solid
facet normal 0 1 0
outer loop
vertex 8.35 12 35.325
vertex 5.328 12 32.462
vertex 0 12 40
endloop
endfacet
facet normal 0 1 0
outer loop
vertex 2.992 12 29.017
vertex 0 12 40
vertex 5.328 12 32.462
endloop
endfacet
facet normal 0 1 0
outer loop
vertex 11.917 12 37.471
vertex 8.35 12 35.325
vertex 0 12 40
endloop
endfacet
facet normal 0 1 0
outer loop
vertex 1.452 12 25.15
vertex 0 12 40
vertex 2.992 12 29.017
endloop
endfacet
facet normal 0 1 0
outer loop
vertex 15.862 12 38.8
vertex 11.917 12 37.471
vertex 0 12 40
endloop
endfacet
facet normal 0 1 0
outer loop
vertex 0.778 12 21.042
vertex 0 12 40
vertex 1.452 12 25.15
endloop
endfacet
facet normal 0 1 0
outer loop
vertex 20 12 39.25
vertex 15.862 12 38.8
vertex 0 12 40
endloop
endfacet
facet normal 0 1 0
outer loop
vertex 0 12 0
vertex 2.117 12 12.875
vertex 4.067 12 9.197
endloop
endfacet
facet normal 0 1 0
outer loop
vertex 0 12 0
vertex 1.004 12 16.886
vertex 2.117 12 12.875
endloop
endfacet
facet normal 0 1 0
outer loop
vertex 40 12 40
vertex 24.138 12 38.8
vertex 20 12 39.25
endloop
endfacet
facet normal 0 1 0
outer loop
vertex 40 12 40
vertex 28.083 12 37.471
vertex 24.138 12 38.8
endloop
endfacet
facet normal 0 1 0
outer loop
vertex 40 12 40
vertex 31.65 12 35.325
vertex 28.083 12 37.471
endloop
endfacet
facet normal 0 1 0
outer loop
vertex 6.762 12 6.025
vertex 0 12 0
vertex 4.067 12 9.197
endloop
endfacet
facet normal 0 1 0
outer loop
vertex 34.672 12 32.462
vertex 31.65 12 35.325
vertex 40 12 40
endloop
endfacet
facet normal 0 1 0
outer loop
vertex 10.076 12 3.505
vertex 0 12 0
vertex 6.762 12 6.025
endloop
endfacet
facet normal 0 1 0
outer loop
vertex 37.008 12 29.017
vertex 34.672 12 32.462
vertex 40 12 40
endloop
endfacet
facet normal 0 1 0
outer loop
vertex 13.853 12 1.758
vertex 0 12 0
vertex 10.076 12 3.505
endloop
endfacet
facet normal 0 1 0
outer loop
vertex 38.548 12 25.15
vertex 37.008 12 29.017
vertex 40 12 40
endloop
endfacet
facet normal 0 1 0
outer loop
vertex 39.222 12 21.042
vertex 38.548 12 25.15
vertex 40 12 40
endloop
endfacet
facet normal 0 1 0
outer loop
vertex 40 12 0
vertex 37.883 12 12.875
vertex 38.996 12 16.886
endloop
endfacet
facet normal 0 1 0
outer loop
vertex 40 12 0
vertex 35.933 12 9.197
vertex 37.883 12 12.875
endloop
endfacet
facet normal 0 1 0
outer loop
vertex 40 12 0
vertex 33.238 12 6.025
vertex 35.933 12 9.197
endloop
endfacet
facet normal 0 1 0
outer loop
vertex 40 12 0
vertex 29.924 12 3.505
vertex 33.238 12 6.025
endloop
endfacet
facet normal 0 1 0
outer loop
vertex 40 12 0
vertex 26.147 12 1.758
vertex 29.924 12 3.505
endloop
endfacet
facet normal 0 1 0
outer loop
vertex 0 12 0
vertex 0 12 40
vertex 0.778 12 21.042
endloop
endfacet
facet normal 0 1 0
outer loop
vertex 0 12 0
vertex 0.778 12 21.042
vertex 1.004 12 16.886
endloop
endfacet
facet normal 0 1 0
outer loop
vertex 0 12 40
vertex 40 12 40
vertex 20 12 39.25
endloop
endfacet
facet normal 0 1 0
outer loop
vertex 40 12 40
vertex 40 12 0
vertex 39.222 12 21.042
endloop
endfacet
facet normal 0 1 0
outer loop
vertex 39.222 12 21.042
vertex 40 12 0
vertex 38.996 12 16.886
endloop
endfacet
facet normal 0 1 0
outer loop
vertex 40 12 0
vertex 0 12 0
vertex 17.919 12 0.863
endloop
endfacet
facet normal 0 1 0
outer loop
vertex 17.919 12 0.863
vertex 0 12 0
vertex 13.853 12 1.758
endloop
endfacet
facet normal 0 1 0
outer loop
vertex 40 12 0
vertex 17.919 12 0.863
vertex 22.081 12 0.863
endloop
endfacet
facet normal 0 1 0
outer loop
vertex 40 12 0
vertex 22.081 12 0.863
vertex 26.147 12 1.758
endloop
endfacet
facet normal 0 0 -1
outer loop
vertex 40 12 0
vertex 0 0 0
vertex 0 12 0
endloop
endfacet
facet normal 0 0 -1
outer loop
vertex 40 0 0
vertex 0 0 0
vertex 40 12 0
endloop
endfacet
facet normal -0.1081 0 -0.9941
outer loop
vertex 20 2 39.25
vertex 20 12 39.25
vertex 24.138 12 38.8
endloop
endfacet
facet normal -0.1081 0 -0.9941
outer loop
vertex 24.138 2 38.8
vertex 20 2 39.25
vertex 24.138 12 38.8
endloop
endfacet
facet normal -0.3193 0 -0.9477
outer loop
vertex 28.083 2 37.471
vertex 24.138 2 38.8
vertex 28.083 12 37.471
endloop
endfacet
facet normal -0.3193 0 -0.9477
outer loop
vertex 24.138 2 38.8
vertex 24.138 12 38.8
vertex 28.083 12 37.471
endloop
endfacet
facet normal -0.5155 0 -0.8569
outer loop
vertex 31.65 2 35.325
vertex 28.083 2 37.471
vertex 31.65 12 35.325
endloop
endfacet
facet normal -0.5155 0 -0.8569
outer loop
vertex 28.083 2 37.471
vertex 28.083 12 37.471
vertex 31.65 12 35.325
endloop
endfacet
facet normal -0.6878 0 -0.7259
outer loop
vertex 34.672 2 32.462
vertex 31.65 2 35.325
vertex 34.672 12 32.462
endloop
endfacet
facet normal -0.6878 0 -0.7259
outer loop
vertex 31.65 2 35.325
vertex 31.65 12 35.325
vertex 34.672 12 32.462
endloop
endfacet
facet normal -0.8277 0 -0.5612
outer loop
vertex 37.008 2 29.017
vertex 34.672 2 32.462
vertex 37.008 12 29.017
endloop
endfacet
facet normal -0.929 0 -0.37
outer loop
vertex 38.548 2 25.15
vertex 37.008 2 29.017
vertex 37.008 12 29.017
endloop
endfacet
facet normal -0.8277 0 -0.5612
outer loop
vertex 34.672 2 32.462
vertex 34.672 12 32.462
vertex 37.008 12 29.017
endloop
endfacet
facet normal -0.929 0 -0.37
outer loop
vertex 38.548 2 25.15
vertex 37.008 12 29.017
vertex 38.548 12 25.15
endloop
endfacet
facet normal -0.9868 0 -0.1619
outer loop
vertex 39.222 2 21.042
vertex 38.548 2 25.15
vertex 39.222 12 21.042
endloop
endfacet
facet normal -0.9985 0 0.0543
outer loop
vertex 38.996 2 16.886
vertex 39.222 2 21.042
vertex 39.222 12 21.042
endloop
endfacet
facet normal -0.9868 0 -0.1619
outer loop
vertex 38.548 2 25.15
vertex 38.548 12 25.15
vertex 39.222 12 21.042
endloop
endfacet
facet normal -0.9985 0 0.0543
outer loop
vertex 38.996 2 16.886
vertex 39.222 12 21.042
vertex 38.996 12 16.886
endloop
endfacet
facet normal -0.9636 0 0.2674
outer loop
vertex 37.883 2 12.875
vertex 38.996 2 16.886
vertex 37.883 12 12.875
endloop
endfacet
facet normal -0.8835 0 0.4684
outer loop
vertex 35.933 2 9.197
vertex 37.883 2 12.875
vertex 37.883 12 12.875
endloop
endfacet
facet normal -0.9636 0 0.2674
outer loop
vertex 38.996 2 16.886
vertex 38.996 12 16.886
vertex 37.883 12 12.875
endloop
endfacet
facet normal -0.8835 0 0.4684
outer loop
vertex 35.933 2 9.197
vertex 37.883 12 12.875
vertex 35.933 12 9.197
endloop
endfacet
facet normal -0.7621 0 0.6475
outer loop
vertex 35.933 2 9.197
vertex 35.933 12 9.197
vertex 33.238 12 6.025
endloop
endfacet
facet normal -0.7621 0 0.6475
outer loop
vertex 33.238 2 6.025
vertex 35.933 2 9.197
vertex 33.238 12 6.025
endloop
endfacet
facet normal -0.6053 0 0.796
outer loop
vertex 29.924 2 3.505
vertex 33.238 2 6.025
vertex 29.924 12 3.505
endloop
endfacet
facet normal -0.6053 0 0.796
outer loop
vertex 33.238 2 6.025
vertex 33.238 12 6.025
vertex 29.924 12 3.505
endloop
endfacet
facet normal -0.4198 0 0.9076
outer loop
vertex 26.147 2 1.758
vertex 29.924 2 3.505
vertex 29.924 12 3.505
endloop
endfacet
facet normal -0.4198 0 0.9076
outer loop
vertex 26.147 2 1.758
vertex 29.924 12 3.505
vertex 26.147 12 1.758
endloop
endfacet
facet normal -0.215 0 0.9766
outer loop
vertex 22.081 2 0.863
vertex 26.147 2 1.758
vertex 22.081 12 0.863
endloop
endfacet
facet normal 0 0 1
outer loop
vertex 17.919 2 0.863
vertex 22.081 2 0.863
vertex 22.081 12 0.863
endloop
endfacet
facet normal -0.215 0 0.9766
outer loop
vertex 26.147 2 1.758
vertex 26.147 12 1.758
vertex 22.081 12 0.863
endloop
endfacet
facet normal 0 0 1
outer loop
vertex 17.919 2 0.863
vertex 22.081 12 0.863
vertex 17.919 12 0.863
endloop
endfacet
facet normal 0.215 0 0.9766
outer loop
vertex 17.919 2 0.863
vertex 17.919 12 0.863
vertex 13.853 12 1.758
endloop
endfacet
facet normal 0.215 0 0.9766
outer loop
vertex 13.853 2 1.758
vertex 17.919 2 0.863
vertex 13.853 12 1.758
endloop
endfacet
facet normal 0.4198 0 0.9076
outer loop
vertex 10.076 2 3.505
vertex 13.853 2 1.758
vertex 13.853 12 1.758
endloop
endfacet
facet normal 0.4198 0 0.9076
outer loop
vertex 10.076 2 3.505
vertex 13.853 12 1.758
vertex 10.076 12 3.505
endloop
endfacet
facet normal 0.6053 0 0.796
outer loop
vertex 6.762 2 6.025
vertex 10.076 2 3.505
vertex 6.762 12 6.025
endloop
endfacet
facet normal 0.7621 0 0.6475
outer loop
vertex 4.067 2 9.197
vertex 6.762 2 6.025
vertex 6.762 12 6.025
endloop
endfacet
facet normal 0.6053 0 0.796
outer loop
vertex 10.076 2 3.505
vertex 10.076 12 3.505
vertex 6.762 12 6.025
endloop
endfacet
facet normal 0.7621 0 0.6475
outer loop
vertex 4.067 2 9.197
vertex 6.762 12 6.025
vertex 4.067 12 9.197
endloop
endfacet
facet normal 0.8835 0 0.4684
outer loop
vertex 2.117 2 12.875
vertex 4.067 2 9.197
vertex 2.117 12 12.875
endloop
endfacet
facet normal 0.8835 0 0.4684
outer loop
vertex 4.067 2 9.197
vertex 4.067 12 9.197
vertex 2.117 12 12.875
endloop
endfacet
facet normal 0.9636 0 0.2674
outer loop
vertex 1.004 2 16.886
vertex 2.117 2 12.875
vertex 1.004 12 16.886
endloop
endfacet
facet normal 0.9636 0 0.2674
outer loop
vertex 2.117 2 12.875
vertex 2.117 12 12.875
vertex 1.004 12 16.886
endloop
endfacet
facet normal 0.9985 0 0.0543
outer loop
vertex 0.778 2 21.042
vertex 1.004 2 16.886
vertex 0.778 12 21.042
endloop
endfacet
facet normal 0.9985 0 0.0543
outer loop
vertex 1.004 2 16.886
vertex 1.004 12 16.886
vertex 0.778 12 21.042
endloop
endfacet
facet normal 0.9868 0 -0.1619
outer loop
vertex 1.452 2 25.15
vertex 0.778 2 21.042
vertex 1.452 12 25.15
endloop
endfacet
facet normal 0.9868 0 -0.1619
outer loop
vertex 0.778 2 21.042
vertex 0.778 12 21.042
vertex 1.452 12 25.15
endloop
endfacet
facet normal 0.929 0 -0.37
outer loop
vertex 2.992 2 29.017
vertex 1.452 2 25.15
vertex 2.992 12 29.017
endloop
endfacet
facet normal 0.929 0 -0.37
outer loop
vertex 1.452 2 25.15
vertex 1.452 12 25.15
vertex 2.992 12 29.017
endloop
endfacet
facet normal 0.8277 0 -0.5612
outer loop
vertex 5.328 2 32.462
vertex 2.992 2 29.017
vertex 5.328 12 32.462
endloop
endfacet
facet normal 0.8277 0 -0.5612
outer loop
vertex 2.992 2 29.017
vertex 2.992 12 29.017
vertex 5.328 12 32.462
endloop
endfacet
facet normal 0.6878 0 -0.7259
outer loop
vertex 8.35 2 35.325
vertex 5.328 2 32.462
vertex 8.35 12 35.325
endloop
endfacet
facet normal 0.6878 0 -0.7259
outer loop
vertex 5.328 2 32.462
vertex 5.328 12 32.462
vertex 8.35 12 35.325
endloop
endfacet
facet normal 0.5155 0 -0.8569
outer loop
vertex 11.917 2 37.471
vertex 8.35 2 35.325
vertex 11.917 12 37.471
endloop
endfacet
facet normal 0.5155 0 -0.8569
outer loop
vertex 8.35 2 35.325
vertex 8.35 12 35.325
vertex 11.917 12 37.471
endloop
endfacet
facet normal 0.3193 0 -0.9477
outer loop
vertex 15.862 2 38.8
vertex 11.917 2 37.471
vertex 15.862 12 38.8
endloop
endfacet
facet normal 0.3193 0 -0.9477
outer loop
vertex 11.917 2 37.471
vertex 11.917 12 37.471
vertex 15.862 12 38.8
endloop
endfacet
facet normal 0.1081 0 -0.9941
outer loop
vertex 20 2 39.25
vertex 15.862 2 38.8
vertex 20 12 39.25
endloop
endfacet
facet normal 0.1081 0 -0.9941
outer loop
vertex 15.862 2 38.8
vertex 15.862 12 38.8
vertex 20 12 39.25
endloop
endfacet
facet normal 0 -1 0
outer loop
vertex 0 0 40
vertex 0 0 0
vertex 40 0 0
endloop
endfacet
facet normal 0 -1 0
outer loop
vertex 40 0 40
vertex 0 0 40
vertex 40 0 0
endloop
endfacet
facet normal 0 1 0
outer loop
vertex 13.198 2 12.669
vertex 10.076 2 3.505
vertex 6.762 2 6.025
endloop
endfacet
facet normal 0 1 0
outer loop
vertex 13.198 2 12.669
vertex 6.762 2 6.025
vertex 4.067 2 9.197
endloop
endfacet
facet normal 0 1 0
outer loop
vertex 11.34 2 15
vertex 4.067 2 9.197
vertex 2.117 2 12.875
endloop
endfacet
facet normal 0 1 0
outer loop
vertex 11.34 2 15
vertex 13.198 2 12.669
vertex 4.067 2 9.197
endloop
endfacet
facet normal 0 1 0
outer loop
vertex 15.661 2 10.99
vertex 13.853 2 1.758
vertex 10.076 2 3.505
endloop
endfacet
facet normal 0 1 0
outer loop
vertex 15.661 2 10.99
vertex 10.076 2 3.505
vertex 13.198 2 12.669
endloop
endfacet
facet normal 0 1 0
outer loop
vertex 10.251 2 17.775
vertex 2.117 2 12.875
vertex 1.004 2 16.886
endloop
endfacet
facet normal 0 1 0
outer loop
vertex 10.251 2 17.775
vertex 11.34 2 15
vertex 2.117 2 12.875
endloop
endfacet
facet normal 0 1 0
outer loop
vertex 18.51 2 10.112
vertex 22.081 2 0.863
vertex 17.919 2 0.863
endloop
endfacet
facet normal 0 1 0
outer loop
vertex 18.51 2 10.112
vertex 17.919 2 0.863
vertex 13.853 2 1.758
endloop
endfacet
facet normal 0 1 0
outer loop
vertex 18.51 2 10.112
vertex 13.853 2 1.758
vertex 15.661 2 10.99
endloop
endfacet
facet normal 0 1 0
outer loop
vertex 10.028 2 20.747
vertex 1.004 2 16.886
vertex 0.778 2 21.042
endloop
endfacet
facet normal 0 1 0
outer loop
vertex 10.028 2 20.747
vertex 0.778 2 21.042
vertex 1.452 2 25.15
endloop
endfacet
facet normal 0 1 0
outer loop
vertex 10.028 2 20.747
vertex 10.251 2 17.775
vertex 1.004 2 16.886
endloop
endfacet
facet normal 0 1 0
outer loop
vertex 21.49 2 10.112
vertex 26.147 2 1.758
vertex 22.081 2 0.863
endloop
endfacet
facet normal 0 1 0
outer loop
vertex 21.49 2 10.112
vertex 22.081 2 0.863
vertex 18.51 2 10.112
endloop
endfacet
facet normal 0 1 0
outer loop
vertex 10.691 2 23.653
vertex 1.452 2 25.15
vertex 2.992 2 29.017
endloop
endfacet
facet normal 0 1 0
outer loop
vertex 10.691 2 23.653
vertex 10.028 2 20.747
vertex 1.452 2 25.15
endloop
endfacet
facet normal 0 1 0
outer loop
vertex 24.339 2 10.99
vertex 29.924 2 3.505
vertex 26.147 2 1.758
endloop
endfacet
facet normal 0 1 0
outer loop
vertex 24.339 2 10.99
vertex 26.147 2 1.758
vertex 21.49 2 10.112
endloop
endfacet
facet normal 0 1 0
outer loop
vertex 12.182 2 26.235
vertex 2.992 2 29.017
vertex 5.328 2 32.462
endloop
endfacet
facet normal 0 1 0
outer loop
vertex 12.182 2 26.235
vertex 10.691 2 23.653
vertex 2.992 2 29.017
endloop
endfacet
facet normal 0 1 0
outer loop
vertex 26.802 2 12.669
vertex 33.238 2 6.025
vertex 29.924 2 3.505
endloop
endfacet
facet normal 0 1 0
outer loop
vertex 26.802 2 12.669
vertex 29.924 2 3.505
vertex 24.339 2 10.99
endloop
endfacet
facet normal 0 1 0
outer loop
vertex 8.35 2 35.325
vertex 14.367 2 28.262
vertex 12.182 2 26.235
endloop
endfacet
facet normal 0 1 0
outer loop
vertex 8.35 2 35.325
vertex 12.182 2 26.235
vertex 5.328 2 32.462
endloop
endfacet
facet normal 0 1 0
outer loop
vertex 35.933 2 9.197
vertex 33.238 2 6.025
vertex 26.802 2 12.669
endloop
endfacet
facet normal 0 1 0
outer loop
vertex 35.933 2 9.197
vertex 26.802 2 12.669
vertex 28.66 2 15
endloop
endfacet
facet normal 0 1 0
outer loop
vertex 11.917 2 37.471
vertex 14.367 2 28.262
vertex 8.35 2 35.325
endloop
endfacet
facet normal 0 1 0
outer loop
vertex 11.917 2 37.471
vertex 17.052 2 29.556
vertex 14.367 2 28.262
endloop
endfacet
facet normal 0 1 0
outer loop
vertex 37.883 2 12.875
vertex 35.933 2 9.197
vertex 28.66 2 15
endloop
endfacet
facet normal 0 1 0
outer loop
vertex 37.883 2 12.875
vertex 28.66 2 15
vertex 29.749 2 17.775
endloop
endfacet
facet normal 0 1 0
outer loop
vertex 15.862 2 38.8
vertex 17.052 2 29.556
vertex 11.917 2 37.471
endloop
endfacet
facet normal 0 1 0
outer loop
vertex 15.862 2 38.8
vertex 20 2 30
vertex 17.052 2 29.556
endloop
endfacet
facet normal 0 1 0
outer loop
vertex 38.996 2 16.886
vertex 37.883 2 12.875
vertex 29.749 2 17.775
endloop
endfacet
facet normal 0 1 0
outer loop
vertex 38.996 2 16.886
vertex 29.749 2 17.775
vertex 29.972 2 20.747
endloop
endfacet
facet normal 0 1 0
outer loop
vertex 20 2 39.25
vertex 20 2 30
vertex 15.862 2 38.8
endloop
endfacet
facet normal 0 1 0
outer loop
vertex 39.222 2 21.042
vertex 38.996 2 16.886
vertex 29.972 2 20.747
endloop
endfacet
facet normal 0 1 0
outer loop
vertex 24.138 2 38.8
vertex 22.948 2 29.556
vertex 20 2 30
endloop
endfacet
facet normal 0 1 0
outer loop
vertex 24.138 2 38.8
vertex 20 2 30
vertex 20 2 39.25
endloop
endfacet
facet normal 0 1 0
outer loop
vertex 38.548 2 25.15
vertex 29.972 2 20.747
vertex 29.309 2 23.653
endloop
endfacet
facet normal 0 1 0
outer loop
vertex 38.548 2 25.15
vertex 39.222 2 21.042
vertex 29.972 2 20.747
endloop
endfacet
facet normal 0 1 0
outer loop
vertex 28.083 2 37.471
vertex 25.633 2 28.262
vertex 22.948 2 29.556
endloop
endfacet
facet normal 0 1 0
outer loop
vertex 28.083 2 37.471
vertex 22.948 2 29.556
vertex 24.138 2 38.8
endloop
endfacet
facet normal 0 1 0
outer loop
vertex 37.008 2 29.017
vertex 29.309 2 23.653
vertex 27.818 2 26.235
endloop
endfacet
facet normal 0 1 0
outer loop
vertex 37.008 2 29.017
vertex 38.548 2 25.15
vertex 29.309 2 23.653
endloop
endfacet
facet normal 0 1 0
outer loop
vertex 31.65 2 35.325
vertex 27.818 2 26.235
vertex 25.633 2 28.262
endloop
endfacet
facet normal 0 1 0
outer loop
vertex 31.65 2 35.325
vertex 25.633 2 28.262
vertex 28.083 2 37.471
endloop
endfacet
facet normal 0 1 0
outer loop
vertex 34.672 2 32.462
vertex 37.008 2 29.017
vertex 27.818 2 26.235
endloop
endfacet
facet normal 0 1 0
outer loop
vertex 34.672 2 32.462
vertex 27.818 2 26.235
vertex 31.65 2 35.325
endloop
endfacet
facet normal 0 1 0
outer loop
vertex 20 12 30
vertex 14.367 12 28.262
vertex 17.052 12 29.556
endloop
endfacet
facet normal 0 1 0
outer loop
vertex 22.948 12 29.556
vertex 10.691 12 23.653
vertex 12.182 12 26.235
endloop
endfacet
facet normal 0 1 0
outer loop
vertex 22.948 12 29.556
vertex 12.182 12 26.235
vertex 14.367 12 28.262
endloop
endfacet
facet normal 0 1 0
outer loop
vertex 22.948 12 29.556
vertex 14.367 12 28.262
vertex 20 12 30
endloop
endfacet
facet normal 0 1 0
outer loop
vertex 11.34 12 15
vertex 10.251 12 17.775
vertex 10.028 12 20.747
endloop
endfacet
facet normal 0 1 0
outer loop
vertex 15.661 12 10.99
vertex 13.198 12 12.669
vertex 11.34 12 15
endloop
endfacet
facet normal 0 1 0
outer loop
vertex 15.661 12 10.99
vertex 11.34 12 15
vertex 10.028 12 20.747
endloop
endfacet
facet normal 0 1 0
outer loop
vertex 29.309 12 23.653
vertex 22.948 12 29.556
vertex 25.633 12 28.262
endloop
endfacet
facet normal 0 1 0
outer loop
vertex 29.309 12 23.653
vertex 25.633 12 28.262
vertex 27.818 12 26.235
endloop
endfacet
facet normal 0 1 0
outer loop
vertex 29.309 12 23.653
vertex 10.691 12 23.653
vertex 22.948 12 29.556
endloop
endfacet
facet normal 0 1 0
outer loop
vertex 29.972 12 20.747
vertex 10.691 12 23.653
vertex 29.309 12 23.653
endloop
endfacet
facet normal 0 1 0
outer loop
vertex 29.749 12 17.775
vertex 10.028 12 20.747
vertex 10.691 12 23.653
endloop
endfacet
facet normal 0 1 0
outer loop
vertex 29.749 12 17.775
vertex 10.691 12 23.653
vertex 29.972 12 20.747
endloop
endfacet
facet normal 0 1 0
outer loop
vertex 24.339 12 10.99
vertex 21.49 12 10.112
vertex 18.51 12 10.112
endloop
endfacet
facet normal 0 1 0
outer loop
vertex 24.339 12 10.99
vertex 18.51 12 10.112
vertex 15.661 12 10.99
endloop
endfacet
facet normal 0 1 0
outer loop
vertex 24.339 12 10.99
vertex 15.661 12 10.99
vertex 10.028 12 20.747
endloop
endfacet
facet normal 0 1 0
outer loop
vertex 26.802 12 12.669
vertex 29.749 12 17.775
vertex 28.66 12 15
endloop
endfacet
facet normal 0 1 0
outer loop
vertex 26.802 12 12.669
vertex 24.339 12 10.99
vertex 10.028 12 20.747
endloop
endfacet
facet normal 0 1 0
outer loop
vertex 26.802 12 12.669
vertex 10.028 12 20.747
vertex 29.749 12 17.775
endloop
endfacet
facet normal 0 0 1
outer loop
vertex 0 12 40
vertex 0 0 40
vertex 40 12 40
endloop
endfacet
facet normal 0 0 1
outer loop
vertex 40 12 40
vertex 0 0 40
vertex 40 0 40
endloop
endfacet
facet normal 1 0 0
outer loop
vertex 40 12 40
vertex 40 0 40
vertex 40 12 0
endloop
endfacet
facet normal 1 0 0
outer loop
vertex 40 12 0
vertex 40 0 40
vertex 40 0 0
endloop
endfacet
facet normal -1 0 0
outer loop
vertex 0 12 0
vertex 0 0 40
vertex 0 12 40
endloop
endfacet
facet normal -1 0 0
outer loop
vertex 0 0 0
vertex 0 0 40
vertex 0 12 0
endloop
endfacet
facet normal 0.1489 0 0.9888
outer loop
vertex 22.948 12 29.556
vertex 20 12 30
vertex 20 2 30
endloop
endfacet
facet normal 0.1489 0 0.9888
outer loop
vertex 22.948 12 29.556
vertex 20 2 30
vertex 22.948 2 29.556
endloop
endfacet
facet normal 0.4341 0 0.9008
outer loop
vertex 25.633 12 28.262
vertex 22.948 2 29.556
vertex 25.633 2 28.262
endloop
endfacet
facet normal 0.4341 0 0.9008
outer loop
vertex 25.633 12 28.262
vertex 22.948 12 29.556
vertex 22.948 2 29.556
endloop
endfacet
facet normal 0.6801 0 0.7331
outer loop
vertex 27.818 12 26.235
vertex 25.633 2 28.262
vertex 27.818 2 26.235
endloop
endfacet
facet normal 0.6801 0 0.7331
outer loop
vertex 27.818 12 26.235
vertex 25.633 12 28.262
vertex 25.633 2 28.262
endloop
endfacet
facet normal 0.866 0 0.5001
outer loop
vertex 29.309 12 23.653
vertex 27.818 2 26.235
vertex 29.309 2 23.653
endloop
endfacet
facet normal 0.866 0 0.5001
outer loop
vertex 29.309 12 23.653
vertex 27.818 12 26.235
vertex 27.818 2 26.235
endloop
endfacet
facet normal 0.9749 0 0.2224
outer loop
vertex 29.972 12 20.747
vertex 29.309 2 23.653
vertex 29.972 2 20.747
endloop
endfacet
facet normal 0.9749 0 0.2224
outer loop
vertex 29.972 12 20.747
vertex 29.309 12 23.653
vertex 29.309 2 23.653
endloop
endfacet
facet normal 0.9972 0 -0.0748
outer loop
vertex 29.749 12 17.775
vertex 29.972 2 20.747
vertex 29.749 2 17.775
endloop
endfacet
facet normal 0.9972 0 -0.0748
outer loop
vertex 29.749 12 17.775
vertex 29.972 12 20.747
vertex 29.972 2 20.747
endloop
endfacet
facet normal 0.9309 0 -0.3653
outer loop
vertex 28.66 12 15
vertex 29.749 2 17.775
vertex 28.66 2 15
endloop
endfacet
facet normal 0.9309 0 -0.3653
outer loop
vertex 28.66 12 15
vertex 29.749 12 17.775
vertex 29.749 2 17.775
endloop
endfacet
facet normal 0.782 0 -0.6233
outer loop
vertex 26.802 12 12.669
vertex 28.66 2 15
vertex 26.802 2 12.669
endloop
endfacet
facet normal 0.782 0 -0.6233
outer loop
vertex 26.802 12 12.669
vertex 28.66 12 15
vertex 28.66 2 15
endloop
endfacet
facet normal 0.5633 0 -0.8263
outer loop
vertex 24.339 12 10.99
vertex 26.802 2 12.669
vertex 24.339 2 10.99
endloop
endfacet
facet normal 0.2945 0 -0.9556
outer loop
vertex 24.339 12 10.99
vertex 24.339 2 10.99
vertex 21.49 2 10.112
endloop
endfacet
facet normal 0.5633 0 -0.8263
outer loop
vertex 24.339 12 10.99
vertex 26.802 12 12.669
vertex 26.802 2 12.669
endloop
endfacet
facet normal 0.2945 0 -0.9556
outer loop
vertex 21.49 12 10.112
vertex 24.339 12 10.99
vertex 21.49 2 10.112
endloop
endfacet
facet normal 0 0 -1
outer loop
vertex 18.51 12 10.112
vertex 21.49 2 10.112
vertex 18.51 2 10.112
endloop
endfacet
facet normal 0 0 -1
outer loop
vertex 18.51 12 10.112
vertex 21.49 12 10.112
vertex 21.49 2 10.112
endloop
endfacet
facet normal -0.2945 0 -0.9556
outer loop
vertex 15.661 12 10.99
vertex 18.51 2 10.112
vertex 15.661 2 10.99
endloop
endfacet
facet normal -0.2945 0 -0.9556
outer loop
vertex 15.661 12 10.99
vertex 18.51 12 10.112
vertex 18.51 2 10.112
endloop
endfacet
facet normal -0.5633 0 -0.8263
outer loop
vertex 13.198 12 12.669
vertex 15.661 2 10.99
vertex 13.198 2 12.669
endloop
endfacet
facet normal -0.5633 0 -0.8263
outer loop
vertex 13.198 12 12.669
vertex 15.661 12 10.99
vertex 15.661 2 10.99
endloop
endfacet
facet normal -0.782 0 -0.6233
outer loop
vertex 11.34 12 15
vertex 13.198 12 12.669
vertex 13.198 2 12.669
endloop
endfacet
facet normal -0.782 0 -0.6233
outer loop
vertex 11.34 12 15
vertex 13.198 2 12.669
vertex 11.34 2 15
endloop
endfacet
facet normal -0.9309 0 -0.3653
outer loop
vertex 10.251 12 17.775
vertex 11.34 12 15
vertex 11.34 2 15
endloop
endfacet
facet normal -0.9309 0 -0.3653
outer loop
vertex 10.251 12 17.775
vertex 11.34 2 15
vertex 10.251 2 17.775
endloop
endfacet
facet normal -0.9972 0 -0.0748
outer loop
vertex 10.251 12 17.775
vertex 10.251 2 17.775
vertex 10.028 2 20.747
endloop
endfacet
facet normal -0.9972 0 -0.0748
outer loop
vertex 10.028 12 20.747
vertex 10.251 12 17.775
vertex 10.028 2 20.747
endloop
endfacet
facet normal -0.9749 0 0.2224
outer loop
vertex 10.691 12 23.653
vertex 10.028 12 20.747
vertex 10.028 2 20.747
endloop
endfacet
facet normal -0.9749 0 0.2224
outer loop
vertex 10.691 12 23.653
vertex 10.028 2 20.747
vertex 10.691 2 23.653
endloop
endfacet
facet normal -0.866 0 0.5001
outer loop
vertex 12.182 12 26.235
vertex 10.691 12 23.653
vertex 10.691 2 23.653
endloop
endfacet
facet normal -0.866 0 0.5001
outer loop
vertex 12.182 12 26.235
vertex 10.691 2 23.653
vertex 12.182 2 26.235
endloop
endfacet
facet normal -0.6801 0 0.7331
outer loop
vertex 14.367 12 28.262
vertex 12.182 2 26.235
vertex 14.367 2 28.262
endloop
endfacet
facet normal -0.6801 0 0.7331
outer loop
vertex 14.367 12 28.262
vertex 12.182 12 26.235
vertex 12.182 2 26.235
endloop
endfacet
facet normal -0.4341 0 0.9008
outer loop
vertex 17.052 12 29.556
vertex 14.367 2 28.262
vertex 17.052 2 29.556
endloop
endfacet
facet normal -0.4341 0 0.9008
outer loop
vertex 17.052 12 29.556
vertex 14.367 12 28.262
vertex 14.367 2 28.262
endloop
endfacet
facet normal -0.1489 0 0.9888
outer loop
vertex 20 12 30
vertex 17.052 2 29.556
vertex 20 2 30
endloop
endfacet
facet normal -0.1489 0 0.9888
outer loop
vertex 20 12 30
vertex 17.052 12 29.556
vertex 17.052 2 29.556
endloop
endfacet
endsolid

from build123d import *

# Parameters (mm, degrees)
SKETCH_1_W          = 40
SKETCH_1_H          = 40
EXTRUDE_1_DEPTH     = 12
SKETCH_2_R          = 19.25
SKETCH_2_R_2        = 10
CUT_EXTRUDE_1_DEPTH = 10


with BuildPart() as part:
    # 草图1 → 凸台-拉伸1 (new body)
    with BuildSketch(Plane(origin=(0, 0, 0), x_dir=(1, 0, 0), z_dir=(0, 1, 0))):
        with Locations((20, -20)):
            Rectangle(SKETCH_1_W, SKETCH_1_H)
    extrude(amount=EXTRUDE_1_DEPTH)

    # 草图2 → 切除-拉伸1 (cut)
    with BuildSketch(Plane(origin=(0, 12, 0), x_dir=(1, 0, 0), z_dir=(0, 1, 0))):
        with Locations(Location((20, -20, 0), (0, 0, 270))):
            Circle(SKETCH_2_R)
        with Locations(Location((20, -20, 0), (0, 0, 270))):
            Circle(SKETCH_2_R_2, mode=Mode.SUBTRACT)
    extrude(amount=-CUT_EXTRUDE_1_DEPTH, mode=Mode.SUBTRACT)


solid = part.part
